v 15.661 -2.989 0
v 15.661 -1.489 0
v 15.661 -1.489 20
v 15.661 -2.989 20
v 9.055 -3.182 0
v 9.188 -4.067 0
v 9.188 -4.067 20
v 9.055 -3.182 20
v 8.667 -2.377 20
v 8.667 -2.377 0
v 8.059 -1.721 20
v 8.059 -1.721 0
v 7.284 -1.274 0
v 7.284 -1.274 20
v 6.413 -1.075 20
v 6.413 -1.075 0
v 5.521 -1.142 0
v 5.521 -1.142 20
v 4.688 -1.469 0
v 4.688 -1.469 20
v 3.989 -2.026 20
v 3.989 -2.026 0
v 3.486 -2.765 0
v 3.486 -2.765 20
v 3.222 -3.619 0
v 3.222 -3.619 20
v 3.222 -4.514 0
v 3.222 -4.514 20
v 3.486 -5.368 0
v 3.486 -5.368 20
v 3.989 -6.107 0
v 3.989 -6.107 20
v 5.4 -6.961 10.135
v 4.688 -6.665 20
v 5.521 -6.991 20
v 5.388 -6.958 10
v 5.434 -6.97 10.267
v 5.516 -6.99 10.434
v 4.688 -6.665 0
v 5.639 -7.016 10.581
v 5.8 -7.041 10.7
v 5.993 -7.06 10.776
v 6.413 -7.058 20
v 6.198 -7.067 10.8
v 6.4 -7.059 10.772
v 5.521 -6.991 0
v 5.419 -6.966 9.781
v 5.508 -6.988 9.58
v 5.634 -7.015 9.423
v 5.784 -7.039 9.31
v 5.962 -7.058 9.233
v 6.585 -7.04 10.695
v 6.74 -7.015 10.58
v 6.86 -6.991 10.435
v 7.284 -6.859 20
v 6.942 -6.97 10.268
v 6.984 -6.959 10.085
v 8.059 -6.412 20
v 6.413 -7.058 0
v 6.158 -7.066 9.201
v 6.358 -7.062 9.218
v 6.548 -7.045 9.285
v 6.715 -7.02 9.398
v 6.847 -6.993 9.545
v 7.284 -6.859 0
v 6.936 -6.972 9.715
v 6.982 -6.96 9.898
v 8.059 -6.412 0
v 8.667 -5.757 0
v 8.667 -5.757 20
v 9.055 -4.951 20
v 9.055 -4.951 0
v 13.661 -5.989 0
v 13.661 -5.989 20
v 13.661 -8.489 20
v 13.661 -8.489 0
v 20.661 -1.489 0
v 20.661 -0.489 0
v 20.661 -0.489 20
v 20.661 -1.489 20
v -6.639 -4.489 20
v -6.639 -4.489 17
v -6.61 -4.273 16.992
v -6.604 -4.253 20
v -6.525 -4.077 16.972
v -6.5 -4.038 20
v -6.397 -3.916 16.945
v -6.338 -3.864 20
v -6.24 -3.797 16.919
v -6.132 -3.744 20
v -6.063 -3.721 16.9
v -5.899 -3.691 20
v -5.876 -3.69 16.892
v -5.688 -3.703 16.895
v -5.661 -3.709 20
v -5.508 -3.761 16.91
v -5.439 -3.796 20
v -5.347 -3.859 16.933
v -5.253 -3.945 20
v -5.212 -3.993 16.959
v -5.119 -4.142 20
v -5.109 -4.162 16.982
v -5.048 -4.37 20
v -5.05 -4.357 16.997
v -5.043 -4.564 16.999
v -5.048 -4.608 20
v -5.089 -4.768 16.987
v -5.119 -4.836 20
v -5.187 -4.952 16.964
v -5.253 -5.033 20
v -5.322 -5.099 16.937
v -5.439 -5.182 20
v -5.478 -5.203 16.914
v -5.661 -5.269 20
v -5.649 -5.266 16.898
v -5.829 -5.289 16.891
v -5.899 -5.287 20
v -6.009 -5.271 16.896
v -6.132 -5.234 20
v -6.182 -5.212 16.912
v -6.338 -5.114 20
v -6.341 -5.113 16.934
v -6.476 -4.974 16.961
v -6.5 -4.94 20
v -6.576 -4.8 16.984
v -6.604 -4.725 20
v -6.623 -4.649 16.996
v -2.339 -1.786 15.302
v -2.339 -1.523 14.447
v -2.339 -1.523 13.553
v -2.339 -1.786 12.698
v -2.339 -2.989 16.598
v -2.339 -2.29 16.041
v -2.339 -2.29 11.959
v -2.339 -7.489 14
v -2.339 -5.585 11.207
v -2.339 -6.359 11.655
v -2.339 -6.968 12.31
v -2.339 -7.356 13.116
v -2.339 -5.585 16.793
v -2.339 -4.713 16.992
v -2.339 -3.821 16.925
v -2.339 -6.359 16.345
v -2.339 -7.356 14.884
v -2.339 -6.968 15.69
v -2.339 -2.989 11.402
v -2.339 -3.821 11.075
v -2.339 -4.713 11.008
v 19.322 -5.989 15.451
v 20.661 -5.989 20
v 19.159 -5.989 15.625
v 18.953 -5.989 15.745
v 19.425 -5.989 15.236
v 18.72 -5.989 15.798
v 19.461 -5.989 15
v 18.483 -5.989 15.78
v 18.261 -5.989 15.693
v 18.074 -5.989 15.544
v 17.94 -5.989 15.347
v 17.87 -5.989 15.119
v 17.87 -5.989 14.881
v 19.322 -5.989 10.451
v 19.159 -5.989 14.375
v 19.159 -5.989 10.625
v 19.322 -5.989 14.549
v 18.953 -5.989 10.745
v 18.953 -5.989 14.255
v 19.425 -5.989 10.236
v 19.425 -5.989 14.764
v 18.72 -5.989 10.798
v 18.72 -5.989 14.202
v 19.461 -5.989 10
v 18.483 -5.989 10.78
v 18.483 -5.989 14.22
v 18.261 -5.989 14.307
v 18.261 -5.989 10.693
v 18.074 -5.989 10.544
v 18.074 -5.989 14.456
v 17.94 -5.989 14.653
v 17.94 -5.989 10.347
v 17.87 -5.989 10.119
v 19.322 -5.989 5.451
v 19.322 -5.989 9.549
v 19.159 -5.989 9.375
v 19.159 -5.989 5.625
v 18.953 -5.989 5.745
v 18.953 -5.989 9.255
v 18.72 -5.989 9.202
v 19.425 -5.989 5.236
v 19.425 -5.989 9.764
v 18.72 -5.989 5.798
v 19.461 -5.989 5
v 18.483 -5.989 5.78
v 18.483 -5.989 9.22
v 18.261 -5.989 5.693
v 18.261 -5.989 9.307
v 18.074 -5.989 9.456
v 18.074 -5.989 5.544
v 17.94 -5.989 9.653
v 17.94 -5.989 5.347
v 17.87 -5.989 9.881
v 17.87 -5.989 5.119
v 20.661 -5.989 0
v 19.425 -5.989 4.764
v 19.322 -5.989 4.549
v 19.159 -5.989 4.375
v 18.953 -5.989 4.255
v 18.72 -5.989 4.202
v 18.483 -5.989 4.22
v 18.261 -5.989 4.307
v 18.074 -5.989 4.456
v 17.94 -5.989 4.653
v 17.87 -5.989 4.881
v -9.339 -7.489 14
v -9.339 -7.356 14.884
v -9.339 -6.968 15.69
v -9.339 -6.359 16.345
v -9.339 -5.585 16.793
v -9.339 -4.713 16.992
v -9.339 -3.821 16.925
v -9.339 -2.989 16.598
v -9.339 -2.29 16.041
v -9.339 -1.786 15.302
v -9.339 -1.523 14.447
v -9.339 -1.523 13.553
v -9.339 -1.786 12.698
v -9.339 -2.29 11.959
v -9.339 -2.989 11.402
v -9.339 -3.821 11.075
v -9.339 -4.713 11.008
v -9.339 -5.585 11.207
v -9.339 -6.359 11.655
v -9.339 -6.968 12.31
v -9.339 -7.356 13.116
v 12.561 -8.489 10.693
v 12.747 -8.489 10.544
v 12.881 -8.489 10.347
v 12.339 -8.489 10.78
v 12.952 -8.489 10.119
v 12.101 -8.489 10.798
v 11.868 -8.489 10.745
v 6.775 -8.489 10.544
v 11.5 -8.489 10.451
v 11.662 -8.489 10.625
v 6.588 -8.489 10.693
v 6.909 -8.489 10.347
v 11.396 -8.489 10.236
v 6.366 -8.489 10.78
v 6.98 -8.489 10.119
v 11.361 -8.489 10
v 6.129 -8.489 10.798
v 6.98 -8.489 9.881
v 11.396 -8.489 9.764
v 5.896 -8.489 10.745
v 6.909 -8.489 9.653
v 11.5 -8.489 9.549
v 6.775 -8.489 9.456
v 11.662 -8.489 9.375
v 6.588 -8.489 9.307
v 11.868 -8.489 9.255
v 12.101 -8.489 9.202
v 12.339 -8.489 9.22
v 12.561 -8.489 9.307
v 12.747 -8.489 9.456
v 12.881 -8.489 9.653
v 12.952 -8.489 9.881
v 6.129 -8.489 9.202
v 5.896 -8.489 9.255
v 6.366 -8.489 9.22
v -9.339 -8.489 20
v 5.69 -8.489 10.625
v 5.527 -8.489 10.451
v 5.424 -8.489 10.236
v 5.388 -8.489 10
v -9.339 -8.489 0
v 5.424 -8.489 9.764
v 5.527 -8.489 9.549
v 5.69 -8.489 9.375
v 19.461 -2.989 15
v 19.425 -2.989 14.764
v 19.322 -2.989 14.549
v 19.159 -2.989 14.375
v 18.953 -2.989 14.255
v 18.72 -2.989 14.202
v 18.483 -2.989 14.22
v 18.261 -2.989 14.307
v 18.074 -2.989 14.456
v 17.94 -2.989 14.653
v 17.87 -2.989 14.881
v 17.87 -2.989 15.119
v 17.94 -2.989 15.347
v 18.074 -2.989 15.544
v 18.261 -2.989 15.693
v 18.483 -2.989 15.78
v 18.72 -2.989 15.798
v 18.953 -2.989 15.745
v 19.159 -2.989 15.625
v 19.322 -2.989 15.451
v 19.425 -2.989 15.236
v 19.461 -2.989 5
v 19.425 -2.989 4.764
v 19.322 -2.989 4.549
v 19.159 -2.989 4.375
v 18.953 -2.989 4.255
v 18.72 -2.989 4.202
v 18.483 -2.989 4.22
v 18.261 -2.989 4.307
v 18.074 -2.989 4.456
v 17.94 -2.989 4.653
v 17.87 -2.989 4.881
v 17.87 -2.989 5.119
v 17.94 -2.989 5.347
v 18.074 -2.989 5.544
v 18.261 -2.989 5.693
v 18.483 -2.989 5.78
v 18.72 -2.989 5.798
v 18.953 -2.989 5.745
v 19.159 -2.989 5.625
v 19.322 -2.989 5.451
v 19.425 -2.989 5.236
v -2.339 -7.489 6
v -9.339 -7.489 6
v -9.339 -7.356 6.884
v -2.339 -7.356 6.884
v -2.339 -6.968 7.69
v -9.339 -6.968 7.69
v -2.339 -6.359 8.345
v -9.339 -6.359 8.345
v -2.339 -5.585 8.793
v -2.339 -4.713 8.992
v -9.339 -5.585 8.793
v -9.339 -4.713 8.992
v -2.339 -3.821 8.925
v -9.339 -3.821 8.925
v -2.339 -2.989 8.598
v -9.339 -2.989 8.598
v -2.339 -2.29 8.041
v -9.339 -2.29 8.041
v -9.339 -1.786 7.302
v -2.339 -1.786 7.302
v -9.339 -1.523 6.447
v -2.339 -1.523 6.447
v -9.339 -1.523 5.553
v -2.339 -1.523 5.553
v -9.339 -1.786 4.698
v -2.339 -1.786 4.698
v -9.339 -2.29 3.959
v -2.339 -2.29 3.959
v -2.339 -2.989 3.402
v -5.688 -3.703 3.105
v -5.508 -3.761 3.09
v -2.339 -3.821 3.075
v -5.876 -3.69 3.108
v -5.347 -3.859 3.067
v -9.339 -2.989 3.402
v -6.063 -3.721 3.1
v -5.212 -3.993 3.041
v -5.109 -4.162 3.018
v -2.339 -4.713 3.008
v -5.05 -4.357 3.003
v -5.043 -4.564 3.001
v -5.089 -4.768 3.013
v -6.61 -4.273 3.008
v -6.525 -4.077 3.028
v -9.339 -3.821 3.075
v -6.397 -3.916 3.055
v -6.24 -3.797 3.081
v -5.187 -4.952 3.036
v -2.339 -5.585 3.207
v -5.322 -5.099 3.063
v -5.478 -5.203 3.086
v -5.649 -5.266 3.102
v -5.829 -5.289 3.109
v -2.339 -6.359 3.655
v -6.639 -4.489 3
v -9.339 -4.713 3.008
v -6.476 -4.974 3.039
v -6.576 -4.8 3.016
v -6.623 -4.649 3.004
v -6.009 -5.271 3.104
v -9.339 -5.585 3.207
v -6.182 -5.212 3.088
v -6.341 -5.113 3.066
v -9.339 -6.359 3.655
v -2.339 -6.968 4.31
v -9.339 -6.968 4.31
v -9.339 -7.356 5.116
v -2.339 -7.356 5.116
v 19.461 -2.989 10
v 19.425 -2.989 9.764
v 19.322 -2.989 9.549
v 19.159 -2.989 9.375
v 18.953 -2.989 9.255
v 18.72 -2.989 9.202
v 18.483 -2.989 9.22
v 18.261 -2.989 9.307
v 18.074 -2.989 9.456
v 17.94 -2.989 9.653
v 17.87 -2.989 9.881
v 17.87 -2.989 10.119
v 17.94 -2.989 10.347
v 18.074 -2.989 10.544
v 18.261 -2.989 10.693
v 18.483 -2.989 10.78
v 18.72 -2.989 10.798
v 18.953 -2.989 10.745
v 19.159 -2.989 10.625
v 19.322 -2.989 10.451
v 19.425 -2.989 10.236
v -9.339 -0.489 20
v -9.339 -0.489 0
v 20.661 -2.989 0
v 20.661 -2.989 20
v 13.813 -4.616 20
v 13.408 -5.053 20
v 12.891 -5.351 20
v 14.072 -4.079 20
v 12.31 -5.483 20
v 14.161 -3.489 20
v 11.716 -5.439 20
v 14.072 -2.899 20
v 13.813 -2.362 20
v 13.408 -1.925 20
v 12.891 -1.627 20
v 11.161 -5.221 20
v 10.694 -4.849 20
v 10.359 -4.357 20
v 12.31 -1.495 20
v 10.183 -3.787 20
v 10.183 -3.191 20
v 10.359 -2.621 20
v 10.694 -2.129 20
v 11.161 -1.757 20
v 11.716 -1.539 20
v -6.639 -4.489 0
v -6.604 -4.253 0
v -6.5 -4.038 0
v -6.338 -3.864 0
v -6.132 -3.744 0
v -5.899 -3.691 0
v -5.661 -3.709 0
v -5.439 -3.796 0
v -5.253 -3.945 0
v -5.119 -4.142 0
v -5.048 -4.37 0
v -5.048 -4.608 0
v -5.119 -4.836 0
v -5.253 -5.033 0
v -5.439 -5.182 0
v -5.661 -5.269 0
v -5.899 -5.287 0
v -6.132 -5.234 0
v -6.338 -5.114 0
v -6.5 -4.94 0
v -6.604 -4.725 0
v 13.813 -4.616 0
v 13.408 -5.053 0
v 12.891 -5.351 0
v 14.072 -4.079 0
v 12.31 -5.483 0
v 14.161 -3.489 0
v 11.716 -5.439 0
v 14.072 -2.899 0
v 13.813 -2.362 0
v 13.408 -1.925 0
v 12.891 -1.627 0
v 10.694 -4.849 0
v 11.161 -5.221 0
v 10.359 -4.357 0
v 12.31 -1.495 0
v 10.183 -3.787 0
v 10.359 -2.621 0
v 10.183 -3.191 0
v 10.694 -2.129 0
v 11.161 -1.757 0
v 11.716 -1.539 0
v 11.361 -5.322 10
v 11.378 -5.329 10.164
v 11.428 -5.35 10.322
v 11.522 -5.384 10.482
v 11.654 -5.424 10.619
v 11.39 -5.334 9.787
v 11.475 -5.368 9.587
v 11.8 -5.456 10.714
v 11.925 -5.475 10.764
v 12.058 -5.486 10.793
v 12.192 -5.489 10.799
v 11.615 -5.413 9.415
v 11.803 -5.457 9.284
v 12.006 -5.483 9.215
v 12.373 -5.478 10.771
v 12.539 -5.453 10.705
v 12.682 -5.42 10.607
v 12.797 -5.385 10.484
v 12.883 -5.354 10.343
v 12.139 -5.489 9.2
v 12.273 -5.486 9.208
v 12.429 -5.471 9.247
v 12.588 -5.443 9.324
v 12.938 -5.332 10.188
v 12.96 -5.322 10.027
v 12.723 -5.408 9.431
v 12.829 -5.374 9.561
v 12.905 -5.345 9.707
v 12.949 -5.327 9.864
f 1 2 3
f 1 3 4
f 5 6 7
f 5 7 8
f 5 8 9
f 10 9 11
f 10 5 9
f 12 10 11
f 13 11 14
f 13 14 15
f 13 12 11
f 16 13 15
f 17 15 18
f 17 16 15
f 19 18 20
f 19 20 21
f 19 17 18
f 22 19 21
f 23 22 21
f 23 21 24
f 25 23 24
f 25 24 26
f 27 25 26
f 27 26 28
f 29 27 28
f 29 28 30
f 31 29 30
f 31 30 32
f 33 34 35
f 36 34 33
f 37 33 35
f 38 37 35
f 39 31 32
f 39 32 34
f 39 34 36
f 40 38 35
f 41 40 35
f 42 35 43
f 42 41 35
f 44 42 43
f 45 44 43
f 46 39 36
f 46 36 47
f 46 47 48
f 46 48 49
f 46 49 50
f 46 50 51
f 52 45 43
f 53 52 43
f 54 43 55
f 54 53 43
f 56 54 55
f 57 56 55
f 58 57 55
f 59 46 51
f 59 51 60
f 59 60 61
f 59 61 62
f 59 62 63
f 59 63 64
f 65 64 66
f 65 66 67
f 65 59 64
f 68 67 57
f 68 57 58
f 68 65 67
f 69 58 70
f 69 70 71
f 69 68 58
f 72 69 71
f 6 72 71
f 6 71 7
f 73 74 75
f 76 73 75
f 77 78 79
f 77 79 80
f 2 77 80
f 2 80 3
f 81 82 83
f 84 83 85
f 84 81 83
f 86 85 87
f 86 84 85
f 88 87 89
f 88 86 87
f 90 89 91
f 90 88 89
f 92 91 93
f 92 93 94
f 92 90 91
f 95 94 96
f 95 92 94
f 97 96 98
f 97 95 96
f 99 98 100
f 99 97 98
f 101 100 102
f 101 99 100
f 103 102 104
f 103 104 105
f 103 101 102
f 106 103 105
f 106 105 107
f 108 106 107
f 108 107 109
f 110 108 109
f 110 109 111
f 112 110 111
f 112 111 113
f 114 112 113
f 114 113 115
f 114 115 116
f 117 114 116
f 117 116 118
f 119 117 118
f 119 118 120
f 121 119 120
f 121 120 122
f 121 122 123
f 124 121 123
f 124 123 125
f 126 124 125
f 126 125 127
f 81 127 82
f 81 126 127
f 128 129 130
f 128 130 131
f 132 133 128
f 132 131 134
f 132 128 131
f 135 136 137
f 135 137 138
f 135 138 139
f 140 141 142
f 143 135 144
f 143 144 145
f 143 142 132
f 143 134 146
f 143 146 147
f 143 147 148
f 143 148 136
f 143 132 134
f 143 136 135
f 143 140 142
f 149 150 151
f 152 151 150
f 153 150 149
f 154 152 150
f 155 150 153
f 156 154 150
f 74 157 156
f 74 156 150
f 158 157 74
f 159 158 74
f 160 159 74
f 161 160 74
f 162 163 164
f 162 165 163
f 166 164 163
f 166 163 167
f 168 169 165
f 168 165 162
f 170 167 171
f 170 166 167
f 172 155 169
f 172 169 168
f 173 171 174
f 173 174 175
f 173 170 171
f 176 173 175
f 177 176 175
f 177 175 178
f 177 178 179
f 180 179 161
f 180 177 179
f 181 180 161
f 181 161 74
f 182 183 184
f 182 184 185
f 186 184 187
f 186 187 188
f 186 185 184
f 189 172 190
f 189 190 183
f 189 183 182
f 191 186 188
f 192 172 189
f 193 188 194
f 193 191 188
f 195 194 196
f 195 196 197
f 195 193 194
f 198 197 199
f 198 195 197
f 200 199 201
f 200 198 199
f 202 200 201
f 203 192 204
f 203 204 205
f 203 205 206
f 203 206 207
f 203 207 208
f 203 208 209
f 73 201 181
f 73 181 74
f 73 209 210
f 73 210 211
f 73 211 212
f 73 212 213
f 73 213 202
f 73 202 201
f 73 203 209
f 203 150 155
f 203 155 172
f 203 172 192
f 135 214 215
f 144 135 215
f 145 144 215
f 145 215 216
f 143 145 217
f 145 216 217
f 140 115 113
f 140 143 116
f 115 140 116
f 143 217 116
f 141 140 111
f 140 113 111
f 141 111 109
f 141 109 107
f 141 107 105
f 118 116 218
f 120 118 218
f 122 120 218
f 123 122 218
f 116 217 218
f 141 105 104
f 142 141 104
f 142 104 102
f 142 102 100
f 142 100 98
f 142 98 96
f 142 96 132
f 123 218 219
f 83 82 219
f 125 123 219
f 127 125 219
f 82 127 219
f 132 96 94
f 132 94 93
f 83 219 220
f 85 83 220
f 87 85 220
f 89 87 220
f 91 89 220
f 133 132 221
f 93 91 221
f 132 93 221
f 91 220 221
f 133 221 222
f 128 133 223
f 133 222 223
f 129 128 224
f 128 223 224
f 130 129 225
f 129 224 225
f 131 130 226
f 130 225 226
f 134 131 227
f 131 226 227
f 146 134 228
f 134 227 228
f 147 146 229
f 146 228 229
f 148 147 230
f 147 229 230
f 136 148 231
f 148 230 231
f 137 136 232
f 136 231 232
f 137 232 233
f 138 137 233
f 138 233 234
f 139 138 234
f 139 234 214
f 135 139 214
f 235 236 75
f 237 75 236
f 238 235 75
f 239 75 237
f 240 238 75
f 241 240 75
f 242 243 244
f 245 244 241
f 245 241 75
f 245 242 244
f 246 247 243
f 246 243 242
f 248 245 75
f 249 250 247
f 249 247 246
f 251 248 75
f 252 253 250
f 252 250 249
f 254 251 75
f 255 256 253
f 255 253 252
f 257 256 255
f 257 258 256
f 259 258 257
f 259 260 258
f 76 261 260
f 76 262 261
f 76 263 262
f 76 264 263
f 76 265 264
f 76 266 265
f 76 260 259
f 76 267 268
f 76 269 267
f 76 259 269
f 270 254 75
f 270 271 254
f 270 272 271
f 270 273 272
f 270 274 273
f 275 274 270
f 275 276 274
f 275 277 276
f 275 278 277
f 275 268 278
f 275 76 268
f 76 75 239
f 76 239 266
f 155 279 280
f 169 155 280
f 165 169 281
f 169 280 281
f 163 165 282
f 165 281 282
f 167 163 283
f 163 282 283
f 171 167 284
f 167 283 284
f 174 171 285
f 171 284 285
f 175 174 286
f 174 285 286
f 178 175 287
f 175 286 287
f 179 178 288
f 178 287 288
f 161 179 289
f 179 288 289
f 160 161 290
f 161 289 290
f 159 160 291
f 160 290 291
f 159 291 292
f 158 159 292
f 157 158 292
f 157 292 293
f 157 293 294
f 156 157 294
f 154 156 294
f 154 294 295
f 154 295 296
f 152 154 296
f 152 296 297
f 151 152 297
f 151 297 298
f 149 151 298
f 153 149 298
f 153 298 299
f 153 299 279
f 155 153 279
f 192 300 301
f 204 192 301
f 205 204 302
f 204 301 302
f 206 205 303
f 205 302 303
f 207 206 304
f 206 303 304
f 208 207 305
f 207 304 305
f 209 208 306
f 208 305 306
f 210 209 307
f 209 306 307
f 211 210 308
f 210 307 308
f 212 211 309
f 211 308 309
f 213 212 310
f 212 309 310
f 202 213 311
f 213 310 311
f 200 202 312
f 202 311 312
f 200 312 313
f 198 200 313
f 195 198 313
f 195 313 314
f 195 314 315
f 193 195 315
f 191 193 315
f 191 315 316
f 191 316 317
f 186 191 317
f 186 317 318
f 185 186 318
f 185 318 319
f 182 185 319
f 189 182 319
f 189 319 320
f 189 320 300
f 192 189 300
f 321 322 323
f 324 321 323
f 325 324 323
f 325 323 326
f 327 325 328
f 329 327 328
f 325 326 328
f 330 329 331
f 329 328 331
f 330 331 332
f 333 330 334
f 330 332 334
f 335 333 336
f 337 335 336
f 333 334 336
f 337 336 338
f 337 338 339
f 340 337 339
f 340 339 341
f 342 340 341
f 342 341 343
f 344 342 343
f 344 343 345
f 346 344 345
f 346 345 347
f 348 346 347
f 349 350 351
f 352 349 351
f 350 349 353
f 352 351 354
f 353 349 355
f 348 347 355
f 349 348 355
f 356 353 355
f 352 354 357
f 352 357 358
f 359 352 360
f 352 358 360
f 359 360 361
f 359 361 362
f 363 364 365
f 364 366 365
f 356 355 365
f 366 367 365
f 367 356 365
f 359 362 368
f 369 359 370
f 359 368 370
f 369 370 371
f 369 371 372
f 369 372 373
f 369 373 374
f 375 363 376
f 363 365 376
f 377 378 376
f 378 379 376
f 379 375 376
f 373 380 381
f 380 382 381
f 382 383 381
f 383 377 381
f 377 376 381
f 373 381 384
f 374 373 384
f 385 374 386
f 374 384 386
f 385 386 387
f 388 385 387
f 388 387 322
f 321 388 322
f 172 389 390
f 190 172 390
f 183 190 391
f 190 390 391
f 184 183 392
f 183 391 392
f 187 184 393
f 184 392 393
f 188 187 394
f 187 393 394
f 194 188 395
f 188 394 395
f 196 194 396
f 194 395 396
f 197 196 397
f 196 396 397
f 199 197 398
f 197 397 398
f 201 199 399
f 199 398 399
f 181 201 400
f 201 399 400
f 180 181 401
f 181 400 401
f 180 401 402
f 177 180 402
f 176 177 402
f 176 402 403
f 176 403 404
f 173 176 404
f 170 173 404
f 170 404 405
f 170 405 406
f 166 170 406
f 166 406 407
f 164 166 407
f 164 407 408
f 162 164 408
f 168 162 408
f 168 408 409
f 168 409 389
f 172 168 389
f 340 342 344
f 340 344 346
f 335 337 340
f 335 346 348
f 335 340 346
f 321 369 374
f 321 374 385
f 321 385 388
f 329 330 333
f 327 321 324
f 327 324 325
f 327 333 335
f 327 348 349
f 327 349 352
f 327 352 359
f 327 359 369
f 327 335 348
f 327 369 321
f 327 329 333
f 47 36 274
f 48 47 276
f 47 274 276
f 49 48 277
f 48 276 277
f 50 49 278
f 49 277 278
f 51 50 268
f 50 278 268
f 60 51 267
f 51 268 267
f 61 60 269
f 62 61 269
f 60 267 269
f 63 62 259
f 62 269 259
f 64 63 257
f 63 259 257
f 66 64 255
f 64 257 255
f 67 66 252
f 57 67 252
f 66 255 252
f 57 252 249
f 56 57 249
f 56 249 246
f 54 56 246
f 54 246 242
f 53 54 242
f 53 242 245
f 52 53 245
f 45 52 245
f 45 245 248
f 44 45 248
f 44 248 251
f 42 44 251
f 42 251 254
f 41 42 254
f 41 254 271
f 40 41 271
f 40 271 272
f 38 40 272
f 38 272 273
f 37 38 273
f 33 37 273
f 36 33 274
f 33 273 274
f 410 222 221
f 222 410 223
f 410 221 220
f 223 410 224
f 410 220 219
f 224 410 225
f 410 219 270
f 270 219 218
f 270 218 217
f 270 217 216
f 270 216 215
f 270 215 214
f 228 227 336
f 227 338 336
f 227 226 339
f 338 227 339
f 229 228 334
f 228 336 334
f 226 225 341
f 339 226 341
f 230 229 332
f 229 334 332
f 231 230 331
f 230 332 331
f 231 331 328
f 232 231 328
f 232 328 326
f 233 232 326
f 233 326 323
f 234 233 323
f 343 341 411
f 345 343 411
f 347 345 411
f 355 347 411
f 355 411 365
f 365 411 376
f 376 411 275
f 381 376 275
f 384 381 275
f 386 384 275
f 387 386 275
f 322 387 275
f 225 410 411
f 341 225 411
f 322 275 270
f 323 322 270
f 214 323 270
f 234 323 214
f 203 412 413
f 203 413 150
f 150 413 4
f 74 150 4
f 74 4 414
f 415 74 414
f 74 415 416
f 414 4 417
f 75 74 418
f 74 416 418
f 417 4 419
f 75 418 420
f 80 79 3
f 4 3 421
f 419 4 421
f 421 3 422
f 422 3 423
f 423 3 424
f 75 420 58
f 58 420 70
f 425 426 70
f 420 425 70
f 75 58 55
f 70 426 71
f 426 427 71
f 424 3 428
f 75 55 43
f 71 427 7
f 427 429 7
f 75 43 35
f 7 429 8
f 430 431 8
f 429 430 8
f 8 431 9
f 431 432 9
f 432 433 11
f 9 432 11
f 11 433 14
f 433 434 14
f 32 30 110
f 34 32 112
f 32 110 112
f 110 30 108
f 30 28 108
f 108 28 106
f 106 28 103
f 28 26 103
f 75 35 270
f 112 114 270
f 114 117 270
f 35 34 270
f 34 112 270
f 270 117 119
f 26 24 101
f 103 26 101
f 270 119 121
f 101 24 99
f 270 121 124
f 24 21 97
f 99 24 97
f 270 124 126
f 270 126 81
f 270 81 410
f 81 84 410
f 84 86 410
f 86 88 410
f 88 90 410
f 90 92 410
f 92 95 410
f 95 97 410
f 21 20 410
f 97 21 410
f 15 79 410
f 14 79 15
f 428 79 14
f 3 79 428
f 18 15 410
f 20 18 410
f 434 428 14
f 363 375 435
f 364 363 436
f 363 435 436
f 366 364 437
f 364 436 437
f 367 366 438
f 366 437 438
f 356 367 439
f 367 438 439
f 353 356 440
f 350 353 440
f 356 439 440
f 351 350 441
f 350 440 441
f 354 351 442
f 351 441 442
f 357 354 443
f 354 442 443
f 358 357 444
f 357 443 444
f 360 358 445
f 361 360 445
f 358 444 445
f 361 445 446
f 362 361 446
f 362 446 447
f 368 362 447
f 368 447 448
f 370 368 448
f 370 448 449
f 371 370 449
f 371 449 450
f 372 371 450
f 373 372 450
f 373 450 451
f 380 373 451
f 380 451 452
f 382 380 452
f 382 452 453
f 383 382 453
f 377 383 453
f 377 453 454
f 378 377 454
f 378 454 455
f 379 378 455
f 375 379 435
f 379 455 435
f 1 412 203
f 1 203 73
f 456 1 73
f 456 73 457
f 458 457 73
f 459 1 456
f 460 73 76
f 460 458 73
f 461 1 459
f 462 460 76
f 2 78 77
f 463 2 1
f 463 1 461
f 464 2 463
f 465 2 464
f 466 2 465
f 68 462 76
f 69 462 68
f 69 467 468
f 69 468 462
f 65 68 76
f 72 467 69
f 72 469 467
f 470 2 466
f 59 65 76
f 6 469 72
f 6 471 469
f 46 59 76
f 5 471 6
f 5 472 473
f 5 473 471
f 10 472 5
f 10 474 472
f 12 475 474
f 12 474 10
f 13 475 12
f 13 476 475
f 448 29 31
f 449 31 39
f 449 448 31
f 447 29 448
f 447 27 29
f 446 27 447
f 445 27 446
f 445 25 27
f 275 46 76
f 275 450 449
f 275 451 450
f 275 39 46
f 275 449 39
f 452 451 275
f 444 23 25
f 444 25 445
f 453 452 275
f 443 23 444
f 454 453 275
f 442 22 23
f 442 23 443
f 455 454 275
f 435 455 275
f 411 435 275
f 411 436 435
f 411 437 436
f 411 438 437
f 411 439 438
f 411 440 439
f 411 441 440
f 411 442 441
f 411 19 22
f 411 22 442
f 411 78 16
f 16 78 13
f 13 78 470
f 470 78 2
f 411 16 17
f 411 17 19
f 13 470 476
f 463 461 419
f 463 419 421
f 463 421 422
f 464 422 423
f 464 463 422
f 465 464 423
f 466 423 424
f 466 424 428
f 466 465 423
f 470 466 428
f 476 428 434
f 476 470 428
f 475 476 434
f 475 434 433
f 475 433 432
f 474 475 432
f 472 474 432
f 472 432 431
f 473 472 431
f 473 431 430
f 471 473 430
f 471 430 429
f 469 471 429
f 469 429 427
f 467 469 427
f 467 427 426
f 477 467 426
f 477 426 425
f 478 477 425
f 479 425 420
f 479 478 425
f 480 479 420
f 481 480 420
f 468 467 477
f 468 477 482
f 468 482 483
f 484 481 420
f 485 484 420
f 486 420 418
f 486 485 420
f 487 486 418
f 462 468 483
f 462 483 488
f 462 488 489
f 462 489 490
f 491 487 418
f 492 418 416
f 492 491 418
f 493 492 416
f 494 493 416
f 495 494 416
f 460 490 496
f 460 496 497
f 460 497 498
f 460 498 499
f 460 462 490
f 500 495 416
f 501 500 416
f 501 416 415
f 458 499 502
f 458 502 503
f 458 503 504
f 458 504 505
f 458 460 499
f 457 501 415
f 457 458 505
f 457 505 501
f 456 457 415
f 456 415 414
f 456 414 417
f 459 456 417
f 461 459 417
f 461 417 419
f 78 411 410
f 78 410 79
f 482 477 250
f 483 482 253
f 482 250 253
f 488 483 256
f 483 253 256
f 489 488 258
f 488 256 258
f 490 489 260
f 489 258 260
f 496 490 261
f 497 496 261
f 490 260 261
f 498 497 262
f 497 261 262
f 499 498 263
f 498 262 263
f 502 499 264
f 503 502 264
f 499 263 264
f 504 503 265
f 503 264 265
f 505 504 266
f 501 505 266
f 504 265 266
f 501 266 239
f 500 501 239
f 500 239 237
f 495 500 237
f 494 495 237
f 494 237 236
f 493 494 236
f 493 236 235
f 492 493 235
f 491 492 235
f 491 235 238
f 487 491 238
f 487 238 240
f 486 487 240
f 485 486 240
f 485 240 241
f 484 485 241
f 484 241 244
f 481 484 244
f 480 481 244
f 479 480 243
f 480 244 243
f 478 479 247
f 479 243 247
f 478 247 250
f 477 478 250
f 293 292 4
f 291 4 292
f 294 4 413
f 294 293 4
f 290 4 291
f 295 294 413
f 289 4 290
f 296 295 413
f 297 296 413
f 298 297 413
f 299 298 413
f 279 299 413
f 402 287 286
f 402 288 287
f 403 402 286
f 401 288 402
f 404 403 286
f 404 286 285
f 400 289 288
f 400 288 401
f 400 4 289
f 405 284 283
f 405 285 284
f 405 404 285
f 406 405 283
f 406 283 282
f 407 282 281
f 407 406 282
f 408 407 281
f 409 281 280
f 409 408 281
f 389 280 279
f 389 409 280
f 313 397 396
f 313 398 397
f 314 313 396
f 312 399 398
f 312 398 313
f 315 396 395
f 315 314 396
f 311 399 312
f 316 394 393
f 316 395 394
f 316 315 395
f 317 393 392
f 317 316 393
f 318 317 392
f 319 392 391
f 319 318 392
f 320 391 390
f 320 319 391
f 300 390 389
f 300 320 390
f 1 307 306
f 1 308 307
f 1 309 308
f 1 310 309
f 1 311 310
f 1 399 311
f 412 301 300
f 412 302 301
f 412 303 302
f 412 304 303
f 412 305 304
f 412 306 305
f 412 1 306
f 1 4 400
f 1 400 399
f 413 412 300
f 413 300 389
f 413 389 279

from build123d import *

# Parameters (mm, degrees)
SKETCH1_R                  = 3
SKETCH1_R_2                = 2
BOSS_EXTRUDE1_DEPTH        = 20
SKETCH2_R                  = 3
CUT_EXTRUDE1_DEPTH         = 7
M2X0_4_TAPPED_HOLE1_REACH  = 31.847
M2X0_4_TAPPED_HOLE1_BORE_R = 0.8
M2X0_4_TAPPED_HOLE2_REACH  = 31.982
M2X0_4_TAPPED_HOLE2_BORE_R = 0.8
M2X0_4_TAPPED_HOLE3_D      = 1.6
M2X0_4_TAPPED_HOLE3_DEPTH  = 3


with BuildPart() as part:
    # Sketch1 → Boss-Extrude1 (new body)
    with BuildSketch(Plane.XY):
        Polygon((20.660587733, -2.988994126), (20.660587733, -5.988994126), (13.660587733, -5.988994126), (13.660587733, -8.488994126), (-9.339412267, -8.488994126), (-9.339412267, -2.742720205), (-9.339412267, -0.488994126), (20.660587733, -0.488994126), (20.660587733, -1.488994126), (15.660587733, -1.488994126), (15.660587733, -2.988994126), align=None)
        with Locations((6.188452756, -4.06657859)):
            Circle(SKETCH1_R, mode=Mode.SUBTRACT)
        with Locations((12.160587733, -3.488994126)):
            Circle(SKETCH1_R_2, mode=Mode.SUBTRACT)
    extrude(amount=BOSS_EXTRUDE1_DEPTH)

    # Sketch2 → Cut-Extrude1 (cut)
    with BuildSketch(Plane.ZY.offset(9.339412267)):
        with Locations(Location((6, -4.488994126, 0), (0, 0, 270))):
            Circle(SKETCH2_R)
        with Locations(Location((14, -4.488994126, 0), (0, 0, 270))):
            Circle(SKETCH2_R)
    extrude(amount=-CUT_EXTRUDE1_DEPTH, mode=Mode.SUBTRACT)

    # M2x0.4 Tapped Hole1 bore → M2x0.4 Tapped Hole1 (cut, up to next)
    with BuildSketch(Plane(origin=(0, -8.488994126, 0), x_dir=(-1, 0, 0), z_dir=(0, -1, 0)), mode=Mode.PRIVATE) as m2x0_4_tapped_hole1_sk1:
        with Locations((-12.160587733, -10)):
            Circle(M2X0_4_TAPPED_HOLE1_BORE_R)
    m2x0_4_tapped_hole1_tool1 = extrude(m2x0_4_tapped_hole1_sk1.sketch, amount=-M2X0_4_TAPPED_HOLE1_REACH, mode=Mode.PRIVATE) & part.part
    # M2x0.4 Tapped Hole1 bore → M2x0.4 Tapped Hole1 (cut, up to next)
    with BuildSketch(Plane(origin=(0, -8.488994126, 0), x_dir=(-1, 0, 0), z_dir=(0, -1, 0)), mode=Mode.PRIVATE) as m2x0_4_tapped_hole1_sk2:
        with Locations((-6.188452756, -10)):
            Circle(M2X0_4_TAPPED_HOLE1_BORE_R)
    m2x0_4_tapped_hole1_tool2 = extrude(m2x0_4_tapped_hole1_sk2.sketch, amount=-M2X0_4_TAPPED_HOLE1_REACH, mode=Mode.PRIVATE) & part.part
    add(m2x0_4_tapped_hole1_tool1.solids().sort_by_distance((12.160588, -8.488994, 10))[0], mode=Mode.SUBTRACT)
    add(m2x0_4_tapped_hole1_tool2.solids().sort_by_distance((6.188453, -8.488994, 10))[0], mode=Mode.SUBTRACT)

    # M2x0.4 Tapped Hole2 bore → M2x0.4 Tapped Hole2 (cut, up to next)
    with BuildSketch(Plane(origin=(0, 0, 0), x_dir=(-1, 0, 0), z_dir=(0, 0, -1)), mode=Mode.PRIVATE) as m2x0_4_tapped_hole2_sk1:
        with Locations((5.839412267, -4.488994126)):
            Circle(M2X0_4_TAPPED_HOLE2_BORE_R)
    m2x0_4_tapped_hole2_tool1 = extrude(m2x0_4_tapped_hole2_sk1.sketch, amount=-M2X0_4_TAPPED_HOLE2_REACH, mode=Mode.PRIVATE) & part.part
    m2x0_4_tapped_hole2 = m2x0_4_tapped_hole2_tool1.solids().sort_by_distance((-5.839412, -4.488994, 0))[0]
    add(m2x0_4_tapped_hole2, mode=Mode.SUBTRACT)

    # Mirror1: M2x0.4 Tapped Hole2 across plane
    add(m2x0_4_tapped_hole2.mirror(Plane(origin=(0, 0, 10), x_dir=(1, 0, 0), z_dir=(0, 0, -1))), mode=Mode.SUBTRACT)

    # M2x0.4 Tapped Hole3
    with Locations(Plane(origin=(0, -5.988994126, 0), x_dir=(-1, 0, 0), z_dir=(0, -1, 0))):
        with Locations((-18.660587733, -5), (-18.660587733, -15), (-18.660587733, -10)):
            Hole(M2X0_4_TAPPED_HOLE3_D / 2, depth=M2X0_4_TAPPED_HOLE3_DEPTH)


solid = part.part
